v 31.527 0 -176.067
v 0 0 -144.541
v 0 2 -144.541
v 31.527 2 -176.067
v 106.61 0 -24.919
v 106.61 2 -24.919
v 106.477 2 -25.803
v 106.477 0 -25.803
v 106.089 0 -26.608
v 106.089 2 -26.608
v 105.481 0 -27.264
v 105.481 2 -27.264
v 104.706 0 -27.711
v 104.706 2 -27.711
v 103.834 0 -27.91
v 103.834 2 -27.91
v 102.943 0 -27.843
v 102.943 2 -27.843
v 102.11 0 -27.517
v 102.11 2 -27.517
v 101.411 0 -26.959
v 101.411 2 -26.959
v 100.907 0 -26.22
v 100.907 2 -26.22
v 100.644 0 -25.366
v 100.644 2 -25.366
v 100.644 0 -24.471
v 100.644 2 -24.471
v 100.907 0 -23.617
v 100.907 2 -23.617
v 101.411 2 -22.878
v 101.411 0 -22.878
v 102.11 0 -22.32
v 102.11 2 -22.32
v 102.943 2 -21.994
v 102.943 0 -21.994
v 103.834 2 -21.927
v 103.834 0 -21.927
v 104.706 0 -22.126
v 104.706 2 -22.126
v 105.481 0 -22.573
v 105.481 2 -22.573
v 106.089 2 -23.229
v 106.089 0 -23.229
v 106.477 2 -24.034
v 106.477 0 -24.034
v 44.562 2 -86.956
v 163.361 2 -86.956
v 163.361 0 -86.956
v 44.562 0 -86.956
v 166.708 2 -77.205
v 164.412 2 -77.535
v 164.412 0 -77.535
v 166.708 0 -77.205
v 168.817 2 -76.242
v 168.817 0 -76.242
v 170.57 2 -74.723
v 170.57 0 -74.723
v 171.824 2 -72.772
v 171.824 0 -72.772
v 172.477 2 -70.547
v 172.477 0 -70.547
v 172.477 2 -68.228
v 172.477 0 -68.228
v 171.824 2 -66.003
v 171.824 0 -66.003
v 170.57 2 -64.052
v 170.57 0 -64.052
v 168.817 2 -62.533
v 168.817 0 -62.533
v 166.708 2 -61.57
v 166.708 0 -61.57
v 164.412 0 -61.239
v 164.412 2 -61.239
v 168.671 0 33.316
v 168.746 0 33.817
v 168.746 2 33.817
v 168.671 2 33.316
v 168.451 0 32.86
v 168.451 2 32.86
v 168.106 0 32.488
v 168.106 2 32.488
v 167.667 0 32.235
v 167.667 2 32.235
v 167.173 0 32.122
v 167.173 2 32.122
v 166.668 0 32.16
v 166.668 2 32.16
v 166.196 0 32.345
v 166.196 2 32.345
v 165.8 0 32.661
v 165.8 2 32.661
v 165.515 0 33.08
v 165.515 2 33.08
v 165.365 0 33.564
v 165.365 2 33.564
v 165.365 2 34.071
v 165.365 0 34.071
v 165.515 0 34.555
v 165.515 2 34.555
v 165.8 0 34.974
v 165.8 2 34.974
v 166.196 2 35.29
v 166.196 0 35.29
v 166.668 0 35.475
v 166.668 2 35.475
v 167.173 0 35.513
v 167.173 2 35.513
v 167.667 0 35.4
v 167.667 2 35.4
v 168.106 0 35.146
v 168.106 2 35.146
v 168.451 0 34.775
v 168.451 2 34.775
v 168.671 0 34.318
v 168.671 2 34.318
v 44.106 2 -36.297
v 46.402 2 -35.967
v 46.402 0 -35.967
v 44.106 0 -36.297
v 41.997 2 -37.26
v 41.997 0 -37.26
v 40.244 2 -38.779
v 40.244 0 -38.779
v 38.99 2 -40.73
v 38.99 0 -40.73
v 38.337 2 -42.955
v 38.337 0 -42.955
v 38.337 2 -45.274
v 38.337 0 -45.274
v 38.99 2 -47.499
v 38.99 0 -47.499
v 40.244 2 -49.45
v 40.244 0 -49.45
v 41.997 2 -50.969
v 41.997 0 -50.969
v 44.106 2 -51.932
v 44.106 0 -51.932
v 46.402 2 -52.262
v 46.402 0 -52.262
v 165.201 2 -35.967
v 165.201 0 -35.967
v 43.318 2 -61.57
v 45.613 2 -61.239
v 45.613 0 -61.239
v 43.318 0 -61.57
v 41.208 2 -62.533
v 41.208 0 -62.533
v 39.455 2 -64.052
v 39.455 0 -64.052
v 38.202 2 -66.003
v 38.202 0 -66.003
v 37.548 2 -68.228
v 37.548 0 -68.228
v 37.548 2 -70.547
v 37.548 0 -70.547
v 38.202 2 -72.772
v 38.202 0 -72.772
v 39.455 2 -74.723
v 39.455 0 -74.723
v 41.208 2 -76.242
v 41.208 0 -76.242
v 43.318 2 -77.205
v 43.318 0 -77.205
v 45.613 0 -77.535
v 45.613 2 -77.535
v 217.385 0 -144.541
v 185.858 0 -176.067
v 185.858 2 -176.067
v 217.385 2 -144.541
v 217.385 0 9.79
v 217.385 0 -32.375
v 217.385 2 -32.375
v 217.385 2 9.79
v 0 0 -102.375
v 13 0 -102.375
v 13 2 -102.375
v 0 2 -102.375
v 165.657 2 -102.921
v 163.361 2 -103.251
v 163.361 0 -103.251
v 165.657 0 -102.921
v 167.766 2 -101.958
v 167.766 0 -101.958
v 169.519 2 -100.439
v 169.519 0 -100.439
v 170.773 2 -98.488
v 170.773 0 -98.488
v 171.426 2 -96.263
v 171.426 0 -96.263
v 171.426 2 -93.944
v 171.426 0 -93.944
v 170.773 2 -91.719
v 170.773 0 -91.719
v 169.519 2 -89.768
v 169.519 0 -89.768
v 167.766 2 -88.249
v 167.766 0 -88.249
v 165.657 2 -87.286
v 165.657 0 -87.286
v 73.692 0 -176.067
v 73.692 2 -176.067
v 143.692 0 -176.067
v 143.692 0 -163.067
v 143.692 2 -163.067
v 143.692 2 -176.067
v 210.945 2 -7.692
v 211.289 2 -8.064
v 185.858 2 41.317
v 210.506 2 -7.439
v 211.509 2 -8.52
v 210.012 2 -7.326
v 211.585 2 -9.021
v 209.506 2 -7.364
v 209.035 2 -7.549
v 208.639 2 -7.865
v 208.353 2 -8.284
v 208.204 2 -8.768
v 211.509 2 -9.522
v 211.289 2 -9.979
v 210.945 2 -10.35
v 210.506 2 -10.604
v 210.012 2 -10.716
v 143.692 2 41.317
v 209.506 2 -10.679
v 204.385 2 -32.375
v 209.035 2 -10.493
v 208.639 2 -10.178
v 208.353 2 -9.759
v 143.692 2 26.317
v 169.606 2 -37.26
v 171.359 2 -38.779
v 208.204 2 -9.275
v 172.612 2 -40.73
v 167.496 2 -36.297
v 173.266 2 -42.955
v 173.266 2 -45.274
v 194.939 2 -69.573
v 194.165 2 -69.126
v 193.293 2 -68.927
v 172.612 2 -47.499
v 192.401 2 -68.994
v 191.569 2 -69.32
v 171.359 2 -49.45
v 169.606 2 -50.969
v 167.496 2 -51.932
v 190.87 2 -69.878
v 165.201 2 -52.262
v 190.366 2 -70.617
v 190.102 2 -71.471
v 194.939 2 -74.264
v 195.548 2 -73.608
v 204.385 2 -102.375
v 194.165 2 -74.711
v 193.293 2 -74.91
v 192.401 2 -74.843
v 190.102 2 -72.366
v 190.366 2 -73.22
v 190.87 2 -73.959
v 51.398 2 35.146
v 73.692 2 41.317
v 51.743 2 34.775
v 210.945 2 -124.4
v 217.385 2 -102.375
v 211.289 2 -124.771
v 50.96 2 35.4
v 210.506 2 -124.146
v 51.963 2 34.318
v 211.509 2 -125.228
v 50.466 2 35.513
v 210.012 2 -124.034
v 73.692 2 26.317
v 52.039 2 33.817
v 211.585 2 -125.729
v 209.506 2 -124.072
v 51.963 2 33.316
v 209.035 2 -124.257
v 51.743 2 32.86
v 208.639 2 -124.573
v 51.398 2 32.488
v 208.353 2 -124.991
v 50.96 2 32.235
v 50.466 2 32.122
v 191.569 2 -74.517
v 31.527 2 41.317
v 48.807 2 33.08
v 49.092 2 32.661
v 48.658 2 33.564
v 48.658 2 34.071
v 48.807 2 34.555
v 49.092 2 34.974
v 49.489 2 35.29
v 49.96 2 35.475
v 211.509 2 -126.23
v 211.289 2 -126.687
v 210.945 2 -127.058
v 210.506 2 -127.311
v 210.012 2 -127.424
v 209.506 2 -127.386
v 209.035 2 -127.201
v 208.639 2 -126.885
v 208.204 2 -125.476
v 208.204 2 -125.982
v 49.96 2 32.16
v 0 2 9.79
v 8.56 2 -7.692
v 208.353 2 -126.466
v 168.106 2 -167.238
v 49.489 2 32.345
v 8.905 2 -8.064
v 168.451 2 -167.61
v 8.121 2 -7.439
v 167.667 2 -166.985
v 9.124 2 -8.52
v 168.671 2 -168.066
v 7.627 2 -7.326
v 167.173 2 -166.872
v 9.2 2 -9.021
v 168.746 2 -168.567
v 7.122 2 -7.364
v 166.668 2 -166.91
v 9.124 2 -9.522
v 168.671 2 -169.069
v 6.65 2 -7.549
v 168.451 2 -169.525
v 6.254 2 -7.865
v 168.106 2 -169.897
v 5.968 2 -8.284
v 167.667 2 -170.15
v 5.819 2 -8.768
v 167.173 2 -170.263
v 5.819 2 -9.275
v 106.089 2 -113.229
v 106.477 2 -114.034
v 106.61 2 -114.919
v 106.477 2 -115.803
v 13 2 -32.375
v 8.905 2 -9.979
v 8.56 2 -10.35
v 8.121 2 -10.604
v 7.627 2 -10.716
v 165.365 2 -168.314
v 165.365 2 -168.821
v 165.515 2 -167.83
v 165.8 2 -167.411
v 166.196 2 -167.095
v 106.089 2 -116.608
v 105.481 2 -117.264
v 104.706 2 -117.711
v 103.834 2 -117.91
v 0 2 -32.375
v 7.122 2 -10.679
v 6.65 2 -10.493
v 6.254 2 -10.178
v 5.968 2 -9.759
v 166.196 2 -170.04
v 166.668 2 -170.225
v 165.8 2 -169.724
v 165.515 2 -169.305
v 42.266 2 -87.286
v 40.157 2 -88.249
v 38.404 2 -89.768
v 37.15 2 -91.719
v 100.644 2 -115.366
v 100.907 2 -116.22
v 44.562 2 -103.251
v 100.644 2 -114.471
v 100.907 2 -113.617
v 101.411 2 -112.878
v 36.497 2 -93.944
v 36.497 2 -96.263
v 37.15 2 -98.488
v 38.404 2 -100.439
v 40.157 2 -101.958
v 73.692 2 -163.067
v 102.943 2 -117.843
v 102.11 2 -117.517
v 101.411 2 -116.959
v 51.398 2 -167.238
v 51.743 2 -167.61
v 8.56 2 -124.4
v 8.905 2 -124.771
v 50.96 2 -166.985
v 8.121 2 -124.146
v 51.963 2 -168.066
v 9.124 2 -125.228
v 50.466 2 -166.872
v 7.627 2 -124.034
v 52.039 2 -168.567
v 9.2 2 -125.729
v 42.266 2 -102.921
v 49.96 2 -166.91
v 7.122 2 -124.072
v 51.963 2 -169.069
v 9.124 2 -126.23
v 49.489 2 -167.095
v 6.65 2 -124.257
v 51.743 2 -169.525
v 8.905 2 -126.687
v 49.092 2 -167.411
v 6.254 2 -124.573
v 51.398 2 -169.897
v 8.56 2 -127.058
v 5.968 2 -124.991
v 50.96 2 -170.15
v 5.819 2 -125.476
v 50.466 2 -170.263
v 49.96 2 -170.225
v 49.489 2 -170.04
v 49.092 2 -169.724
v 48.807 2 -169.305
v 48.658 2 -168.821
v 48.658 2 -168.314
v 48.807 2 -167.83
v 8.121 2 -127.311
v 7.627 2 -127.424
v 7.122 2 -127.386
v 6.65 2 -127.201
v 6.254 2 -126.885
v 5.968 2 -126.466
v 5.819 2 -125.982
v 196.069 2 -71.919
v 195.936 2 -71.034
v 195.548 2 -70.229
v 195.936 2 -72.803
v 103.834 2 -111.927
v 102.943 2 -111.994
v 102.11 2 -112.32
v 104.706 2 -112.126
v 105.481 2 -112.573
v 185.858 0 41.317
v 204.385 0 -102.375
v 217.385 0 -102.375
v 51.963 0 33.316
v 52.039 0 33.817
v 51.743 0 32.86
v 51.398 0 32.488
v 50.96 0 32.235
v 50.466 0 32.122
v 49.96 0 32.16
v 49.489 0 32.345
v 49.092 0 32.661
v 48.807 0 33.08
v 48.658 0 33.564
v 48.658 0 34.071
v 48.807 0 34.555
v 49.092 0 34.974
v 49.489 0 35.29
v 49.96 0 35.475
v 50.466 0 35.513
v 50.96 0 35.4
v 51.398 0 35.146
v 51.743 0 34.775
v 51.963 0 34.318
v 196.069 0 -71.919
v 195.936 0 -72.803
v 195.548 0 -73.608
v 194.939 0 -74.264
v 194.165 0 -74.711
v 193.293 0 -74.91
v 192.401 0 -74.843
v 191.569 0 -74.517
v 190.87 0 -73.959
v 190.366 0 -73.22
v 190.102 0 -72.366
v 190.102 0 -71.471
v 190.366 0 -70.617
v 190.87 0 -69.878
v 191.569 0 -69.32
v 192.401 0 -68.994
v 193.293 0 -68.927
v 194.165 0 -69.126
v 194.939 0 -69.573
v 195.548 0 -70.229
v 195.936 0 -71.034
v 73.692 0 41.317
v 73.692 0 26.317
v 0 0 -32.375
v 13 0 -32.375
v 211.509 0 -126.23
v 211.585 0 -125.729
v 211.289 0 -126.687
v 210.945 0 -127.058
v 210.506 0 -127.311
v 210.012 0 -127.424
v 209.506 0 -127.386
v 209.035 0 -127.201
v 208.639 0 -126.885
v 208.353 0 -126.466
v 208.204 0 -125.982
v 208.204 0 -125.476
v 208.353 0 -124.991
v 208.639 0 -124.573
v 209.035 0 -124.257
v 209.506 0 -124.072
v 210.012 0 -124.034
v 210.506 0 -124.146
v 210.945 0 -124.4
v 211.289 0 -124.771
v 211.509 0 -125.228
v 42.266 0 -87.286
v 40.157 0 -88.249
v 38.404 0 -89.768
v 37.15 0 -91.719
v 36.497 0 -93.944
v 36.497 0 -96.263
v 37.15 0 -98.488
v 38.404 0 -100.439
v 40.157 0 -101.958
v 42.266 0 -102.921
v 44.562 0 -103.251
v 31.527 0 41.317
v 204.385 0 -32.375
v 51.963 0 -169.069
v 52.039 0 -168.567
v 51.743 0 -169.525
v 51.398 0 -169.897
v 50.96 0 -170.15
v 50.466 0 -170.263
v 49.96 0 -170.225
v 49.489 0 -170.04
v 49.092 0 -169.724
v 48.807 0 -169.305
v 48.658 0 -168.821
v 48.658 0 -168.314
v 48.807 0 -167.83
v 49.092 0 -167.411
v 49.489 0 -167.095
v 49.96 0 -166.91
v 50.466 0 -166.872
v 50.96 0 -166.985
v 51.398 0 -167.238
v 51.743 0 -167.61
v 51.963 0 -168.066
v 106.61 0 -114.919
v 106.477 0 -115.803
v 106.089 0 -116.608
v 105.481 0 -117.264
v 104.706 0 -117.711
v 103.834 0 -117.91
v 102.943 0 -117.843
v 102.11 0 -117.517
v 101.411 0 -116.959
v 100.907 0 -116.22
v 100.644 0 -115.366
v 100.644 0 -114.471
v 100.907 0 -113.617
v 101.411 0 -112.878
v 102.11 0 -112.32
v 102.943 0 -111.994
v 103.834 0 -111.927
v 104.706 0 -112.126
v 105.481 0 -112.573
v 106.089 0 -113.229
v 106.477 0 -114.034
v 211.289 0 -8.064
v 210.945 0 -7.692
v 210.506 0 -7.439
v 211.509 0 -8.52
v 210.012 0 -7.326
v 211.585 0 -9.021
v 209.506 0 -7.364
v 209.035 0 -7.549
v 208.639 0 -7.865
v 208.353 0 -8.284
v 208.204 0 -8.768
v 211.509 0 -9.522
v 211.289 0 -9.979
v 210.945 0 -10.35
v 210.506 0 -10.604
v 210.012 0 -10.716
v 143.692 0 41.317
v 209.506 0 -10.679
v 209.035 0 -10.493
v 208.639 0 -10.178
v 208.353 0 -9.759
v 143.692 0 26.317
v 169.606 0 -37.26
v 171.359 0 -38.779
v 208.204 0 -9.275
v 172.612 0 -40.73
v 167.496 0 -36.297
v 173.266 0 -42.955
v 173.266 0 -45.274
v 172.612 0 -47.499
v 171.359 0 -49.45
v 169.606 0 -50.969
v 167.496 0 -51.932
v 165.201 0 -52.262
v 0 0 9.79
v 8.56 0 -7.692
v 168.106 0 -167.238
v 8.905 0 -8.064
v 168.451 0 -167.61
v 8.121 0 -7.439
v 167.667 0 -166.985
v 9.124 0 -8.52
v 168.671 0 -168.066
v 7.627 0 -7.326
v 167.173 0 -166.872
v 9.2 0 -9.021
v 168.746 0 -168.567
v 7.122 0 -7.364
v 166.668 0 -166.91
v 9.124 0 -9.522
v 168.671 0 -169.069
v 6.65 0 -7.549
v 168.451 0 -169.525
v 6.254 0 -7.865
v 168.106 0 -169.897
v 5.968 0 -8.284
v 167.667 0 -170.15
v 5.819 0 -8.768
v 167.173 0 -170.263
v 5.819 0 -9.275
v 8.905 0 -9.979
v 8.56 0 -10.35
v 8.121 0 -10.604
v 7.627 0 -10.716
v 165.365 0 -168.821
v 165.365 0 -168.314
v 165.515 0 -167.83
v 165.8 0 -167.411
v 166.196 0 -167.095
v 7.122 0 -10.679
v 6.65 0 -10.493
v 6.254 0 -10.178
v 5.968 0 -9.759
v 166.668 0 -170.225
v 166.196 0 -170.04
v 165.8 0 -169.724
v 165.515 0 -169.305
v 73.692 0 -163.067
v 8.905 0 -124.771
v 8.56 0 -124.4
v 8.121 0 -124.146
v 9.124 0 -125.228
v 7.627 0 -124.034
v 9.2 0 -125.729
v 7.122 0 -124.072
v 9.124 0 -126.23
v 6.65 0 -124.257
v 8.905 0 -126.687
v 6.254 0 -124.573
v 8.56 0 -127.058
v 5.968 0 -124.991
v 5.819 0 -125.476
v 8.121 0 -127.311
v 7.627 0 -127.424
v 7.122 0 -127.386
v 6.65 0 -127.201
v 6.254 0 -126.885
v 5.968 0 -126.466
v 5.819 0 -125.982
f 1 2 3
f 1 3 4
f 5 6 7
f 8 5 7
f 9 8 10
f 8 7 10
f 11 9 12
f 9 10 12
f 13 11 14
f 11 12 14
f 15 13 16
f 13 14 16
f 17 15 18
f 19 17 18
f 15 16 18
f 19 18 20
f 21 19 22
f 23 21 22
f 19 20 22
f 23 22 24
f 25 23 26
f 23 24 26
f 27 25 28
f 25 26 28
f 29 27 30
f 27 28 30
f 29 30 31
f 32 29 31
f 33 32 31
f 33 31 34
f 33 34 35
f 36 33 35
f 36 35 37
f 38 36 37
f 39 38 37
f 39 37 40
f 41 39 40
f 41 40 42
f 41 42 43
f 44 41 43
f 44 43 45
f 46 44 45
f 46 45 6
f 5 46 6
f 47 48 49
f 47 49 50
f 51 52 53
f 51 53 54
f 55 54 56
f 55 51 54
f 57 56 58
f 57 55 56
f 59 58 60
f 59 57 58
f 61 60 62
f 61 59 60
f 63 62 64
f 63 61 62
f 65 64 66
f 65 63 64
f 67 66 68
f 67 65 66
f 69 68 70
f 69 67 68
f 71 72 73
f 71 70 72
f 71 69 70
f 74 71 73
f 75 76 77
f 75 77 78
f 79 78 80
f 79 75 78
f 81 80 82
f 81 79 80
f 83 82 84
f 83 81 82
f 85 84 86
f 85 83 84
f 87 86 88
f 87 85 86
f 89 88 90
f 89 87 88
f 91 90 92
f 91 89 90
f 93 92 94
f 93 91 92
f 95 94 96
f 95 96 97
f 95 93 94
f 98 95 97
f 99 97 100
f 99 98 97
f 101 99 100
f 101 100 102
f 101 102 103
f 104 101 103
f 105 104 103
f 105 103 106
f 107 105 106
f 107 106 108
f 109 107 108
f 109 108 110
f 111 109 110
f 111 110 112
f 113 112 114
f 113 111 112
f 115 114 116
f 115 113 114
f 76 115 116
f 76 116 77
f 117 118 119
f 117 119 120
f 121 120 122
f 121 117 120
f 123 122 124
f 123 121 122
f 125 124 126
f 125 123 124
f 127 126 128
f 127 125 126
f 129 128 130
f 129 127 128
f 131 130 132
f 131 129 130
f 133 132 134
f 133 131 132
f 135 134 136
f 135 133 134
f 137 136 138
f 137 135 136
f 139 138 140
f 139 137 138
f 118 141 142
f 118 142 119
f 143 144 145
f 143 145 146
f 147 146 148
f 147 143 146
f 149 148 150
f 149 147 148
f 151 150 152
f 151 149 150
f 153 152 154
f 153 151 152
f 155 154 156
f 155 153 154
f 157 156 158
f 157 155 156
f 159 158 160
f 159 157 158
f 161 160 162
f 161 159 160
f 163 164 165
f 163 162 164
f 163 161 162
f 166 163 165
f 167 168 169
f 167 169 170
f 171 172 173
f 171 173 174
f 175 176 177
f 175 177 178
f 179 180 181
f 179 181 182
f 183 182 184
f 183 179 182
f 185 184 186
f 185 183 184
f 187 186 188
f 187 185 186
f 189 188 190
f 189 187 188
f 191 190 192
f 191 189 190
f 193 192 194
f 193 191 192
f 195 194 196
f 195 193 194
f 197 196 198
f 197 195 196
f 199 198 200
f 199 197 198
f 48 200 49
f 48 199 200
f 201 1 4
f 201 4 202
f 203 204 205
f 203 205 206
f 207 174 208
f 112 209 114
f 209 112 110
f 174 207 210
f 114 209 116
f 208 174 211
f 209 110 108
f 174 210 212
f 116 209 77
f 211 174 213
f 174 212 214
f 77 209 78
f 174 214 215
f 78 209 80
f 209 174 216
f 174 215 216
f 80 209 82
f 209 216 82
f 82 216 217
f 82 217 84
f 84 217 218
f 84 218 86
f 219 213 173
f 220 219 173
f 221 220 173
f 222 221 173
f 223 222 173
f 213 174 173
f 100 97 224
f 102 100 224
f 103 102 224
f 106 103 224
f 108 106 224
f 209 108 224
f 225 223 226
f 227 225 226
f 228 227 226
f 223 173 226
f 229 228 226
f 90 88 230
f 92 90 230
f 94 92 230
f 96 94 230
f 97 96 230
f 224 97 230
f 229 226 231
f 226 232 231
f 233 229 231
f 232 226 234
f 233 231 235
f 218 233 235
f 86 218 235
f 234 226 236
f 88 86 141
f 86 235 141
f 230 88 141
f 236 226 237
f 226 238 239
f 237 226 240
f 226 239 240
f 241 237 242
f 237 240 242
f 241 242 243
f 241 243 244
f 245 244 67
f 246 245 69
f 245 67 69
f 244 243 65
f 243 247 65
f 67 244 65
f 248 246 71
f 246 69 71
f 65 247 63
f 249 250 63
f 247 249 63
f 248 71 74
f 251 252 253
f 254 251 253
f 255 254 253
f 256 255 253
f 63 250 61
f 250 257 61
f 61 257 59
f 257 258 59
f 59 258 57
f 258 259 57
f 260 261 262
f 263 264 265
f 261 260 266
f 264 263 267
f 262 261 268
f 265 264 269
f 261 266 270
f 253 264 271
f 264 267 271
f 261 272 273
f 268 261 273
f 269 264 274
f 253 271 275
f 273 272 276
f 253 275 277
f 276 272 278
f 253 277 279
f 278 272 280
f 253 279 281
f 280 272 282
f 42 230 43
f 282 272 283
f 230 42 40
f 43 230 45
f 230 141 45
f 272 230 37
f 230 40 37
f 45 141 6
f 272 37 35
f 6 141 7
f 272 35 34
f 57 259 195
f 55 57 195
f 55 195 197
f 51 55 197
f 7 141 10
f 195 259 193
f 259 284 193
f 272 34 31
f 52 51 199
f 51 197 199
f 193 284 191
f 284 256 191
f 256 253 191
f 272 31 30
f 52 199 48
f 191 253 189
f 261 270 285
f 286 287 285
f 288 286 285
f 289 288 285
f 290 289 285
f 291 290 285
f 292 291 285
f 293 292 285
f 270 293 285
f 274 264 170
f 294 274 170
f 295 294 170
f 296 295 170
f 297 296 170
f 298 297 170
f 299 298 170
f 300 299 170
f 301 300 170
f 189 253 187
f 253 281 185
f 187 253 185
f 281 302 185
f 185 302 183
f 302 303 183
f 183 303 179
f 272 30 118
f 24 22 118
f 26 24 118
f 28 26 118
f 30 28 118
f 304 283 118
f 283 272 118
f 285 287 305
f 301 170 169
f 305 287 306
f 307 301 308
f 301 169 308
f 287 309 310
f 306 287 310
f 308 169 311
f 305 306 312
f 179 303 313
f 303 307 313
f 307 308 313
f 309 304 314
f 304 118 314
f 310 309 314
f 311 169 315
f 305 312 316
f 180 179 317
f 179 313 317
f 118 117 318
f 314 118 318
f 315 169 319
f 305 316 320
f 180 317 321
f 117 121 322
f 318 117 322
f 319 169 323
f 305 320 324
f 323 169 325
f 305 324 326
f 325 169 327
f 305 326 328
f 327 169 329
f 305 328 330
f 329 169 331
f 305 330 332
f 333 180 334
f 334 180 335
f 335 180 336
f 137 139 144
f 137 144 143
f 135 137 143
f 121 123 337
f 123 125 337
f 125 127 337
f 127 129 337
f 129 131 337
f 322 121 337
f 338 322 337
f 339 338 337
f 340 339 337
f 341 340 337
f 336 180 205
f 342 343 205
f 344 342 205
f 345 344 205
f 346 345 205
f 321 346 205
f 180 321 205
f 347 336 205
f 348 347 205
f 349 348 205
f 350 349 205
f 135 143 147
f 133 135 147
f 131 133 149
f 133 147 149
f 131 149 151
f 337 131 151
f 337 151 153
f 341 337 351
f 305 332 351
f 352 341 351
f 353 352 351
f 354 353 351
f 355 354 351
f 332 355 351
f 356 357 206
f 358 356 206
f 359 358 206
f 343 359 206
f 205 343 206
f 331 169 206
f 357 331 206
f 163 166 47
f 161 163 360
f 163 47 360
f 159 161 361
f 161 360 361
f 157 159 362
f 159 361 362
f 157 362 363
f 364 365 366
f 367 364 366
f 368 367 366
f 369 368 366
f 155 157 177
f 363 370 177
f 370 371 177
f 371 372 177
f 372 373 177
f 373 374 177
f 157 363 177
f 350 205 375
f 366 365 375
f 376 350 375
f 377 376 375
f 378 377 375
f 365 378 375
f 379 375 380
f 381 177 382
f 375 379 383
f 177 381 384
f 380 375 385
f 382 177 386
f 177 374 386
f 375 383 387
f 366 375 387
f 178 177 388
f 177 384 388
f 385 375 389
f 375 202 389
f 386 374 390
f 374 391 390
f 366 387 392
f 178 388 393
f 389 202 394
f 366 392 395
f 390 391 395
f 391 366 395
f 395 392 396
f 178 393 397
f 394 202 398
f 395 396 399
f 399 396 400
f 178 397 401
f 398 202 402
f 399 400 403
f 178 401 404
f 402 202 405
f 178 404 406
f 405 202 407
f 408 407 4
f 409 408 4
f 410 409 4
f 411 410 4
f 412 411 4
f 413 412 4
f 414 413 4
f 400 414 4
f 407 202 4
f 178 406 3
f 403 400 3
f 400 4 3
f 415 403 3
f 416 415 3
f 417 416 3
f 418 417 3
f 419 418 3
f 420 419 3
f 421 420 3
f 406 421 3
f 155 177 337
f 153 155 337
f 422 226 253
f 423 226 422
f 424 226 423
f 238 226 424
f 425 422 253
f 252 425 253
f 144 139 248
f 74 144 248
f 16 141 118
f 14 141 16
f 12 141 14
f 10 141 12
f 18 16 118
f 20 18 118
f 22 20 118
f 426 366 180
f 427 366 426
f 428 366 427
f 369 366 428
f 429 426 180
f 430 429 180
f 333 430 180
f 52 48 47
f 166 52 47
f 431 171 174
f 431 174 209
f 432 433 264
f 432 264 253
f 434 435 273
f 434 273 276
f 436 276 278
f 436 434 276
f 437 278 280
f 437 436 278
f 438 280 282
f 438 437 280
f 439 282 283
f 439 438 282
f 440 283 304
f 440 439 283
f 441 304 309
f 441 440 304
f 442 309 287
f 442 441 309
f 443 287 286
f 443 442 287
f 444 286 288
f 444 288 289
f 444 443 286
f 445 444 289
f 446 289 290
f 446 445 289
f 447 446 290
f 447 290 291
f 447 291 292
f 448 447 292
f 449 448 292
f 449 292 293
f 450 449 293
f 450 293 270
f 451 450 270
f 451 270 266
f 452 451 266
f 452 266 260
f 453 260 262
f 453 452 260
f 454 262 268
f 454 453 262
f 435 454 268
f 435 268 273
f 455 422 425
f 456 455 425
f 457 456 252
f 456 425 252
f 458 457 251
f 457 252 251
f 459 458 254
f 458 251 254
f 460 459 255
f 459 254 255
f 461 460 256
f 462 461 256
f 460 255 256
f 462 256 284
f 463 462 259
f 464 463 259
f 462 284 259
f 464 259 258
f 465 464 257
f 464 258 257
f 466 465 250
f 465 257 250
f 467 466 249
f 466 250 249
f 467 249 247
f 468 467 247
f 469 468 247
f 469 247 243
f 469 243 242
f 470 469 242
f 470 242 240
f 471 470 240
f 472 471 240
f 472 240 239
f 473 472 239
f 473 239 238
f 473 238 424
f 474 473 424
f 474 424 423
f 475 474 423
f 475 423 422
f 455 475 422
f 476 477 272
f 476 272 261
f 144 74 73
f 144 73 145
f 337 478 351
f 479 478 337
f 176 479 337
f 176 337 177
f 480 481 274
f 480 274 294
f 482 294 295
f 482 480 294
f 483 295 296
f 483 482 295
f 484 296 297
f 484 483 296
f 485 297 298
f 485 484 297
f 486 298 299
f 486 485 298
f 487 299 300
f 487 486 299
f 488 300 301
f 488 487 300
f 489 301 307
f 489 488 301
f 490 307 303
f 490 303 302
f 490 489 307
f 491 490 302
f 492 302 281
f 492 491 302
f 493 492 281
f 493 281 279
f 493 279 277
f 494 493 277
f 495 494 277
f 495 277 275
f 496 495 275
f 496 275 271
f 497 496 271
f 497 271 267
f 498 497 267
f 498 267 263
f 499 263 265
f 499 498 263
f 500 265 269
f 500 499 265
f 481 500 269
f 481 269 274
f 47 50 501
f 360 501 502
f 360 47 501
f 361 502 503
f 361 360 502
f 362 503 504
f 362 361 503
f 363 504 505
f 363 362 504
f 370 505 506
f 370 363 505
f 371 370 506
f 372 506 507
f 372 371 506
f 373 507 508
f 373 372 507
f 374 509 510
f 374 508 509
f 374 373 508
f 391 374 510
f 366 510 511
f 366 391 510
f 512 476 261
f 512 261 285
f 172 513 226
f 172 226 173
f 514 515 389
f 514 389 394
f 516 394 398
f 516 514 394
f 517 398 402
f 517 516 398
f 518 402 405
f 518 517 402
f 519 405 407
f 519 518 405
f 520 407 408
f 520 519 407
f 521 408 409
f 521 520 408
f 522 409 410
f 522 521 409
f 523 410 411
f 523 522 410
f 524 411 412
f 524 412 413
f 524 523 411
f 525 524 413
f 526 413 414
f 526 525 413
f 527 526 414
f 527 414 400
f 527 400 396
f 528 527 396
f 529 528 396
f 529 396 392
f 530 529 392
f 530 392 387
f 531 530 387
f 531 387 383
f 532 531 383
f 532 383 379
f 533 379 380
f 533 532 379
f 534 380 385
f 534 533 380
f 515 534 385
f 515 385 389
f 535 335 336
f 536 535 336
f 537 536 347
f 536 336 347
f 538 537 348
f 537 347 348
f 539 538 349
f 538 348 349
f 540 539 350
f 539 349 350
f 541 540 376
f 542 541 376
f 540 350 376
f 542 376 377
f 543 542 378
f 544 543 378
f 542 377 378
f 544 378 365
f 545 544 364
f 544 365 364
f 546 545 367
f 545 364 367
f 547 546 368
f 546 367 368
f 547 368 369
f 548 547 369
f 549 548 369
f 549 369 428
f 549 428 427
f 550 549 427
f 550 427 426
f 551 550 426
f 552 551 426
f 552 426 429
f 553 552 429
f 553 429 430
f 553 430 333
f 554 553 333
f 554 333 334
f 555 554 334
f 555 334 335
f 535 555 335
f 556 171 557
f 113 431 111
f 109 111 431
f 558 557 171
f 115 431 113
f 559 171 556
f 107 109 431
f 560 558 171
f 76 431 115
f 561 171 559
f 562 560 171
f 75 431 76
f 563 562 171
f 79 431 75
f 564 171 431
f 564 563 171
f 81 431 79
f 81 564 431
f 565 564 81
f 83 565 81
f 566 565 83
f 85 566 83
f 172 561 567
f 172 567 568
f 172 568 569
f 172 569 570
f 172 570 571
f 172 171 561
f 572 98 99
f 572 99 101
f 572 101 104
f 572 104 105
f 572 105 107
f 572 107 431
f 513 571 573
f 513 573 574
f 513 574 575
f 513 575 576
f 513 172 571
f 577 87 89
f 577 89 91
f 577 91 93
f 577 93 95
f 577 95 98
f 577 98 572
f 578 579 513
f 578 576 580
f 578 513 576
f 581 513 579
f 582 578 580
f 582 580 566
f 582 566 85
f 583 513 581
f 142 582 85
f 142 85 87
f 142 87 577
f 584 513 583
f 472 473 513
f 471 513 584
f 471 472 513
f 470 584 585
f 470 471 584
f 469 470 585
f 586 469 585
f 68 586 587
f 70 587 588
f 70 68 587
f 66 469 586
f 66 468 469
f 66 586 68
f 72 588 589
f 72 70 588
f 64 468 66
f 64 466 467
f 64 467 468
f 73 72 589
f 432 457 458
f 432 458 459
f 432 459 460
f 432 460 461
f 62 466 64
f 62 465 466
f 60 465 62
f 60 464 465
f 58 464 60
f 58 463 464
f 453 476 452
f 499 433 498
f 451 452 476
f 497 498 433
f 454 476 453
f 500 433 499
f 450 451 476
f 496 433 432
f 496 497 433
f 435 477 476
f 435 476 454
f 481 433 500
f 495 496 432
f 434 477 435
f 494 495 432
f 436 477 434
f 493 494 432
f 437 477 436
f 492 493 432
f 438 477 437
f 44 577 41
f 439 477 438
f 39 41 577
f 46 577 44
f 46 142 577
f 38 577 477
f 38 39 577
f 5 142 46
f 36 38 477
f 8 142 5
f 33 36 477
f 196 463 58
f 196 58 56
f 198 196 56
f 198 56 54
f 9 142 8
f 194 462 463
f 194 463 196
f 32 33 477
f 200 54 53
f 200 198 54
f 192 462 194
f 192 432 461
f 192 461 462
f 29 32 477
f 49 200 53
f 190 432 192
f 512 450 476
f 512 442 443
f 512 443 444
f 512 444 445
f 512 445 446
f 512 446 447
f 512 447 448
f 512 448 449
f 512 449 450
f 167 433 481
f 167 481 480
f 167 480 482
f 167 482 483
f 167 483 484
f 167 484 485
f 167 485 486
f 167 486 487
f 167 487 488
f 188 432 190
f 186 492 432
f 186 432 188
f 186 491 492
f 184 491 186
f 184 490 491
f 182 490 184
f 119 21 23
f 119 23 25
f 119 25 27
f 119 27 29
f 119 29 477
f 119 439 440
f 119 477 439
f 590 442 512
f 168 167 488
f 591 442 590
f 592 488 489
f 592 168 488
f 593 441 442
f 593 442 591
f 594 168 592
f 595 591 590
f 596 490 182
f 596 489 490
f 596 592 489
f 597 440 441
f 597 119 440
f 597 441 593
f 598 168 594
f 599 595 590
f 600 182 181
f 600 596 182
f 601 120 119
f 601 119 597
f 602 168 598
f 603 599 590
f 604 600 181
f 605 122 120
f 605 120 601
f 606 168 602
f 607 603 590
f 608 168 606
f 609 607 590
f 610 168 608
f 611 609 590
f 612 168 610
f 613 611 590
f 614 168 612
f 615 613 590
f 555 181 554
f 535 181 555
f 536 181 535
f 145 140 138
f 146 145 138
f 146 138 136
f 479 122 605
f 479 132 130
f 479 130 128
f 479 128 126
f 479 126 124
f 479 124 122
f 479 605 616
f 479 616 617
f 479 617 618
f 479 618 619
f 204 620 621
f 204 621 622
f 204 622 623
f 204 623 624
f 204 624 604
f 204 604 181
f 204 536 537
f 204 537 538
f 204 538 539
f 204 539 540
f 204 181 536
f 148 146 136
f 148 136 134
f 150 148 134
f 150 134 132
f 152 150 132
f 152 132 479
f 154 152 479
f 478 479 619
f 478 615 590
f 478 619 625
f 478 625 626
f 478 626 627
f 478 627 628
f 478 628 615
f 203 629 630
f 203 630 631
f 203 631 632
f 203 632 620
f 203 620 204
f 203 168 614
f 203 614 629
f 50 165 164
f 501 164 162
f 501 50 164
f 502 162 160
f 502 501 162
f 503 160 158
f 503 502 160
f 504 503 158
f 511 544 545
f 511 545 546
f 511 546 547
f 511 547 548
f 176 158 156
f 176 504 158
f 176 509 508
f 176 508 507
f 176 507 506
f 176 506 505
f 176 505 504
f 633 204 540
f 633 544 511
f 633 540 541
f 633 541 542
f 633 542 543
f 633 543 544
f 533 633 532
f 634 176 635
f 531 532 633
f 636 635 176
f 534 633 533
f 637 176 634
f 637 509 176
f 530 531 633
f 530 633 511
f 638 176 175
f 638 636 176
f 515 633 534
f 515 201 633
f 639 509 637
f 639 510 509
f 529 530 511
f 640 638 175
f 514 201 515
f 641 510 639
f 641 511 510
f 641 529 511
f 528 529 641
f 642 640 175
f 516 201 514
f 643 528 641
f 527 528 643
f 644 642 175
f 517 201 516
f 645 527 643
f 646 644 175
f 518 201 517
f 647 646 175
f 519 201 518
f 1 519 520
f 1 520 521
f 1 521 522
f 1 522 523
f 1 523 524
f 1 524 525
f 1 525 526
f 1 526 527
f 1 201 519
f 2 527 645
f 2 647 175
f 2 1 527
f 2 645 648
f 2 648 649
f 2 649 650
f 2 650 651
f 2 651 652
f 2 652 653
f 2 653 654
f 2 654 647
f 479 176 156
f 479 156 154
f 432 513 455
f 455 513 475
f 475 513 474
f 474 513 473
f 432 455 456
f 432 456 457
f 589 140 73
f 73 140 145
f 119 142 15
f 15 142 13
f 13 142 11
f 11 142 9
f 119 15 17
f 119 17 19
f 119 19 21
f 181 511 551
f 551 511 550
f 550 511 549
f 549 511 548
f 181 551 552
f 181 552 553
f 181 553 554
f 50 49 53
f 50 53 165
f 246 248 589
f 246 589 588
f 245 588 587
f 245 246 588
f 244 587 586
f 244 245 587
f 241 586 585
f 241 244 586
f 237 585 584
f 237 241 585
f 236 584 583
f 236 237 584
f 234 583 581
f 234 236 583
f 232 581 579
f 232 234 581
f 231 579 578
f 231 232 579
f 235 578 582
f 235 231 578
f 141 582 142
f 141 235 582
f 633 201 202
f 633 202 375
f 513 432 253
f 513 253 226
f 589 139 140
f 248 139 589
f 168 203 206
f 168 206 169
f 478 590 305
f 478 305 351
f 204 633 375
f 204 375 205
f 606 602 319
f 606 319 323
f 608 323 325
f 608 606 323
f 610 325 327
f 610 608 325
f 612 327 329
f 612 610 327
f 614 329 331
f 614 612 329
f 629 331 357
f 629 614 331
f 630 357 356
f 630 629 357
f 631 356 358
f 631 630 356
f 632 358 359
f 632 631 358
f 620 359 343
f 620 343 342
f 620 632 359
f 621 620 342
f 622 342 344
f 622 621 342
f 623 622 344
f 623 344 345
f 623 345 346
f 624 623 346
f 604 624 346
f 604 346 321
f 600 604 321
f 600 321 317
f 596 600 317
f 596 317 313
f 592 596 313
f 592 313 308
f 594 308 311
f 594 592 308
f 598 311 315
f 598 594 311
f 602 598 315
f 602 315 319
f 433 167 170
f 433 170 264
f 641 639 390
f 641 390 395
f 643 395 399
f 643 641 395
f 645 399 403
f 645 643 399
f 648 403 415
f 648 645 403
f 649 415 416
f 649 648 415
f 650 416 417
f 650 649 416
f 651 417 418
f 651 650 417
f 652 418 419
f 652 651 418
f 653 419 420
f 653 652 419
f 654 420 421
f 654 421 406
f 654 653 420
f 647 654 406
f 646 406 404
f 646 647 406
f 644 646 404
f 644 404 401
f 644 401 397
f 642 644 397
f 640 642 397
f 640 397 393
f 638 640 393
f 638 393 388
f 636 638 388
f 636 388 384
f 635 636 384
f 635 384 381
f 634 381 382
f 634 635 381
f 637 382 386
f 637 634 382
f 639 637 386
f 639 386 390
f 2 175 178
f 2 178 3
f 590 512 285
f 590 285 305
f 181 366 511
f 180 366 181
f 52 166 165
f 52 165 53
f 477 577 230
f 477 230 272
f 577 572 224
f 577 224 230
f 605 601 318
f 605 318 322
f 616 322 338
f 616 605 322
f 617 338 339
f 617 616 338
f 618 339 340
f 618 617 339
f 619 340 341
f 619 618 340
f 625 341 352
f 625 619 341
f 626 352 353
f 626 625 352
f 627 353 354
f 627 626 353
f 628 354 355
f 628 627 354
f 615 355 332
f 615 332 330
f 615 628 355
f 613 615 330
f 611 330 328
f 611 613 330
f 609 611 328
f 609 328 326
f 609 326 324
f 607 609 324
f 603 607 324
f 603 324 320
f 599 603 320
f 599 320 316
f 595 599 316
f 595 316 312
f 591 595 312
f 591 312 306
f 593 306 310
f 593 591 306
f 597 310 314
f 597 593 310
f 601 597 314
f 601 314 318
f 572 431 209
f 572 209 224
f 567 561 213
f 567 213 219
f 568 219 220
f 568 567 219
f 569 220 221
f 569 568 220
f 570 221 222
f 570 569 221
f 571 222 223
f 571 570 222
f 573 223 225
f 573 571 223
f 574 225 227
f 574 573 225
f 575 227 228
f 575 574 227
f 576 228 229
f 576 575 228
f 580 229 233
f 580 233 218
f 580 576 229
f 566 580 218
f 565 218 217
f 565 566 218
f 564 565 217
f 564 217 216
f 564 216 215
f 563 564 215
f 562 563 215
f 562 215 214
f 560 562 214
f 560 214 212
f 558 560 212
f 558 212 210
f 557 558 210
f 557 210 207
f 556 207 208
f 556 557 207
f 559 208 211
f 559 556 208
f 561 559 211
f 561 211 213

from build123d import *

# Parameters (mm, degrees)
SKETCH_1_R          = 1.7
EXTRUDE_1_DEPTH     = 2
SKETCH_3_R          = 3
CUT_EXTRUDE_1_DEPTH = 10
CUT_EXTRUDE_2_DEPTH = 10


with BuildPart() as part:
    # 草图1 → 凸台-拉伸1 (new body)
    with BuildSketch(Plane(origin=(0, 0, 0), x_dir=(1, 0, 0), z_dir=(0, 1, 0))):
        Polygon((0, -9.790421162), (0, 32.375054838), (13, 32.375054838), (13, 102.375054838), (0, 102.375054838), (0, 144.54053128), (31.526911935, 176.067443214), (73.692388376, 176.067443215), (73.692388376, 163.067443215), (143.692388376, 163.067443215), (143.692388376, 176.067443215), (185.857864376, 176.067443214), (217.384776311, 144.54053128), (217.384776311, 102.375054838), (204.384776311, 102.375054838), (204.384776311, 32.375054838), (217.384776311, 32.375054838), (217.384776311, -9.790421162), (185.857864376, -41.317333096), (143.692388376, -41.317333096), (143.692388376, -26.317333096), (73.692388376, -26.317333096), (73.692388376, -41.317333096), (31.526911935, -41.317333096), align=None)
        with Locations((209.884776311, 9.021225987)):
            Circle(SKETCH_1_R, mode=Mode.SUBTRACT)
        with Locations((209.884776311, 125.728884132)):
            Circle(SKETCH_1_R, mode=Mode.SUBTRACT)
        with Locations((167.046217228, 168.567443215)):
            Circle(SKETCH_1_R, mode=Mode.SUBTRACT)
        with Locations((50.338559083, 168.567443214)):
            Circle(SKETCH_1_R, mode=Mode.SUBTRACT)
        with Locations((7.5, 125.728884132)):
            Circle(SKETCH_1_R, mode=Mode.SUBTRACT)
        with Locations((7.5, 9.021225987)):
            Circle(SKETCH_1_R, mode=Mode.SUBTRACT)
        with Locations((50.338559083, -33.817333096)):
            Circle(SKETCH_1_R, mode=Mode.SUBTRACT)
        with Locations((167.046217228, -33.817333096)):
            Circle(SKETCH_1_R, mode=Mode.SUBTRACT)
    extrude(amount=EXTRUDE_1_DEPTH)

    # 草图3 → 切除-拉伸1 (cut)
    with BuildSketch(Plane(origin=(0, 2, 0), x_dir=(1, 0, 0), z_dir=(0, 1, 0))):
        with Locations((103.610094152, 114.918520178)):
            Circle(SKETCH_3_R)
        with Locations((103.610094152, 24.918520178)):
            Circle(SKETCH_3_R)
        with Locations((193.068894152, 71.918520178)):
            Circle(SKETCH_3_R)
    extrude(amount=-CUT_EXTRUDE_1_DEPTH, mode=Mode.SUBTRACT)

    # 草图4 → 切除-拉伸2 (cut)
    with BuildSketch(Plane(origin=(0, 2, 0), x_dir=(1, 0, 0), z_dir=(0, 1, 0))):
        with BuildLine():
            Line((44.561779376, 103.251399725), (163.361103837, 103.251399725))
            ThreePointArc((163.361103837, 103.251399725), (171.508845116, 95.103658445), (163.361103837, 86.955917166))
            Line((163.361103837, 86.955917166), (44.561779376, 86.955917166))
            ThreePointArc((44.561779376, 86.955917166), (36.414038096, 95.103658445), (44.561779376, 103.251399725))
        make_face()
        with BuildLine():
            Line((45.613100831, 77.534957336), (164.412425292, 77.534957336))
            ThreePointArc((164.412425292, 77.534957336), (172.560166571, 69.387216057), (164.412425292, 61.239474778))
            Line((164.412425292, 61.239474778), (45.613100831, 61.239474778))
            ThreePointArc((45.613100831, 61.239474778), (37.465359552, 69.387216057), (45.613100831, 77.534957336))
        make_face()
        with BuildLine():
            Line((46.401591922, 52.262309138), (165.200916384, 52.262309138))
            ThreePointArc((165.200916384, 52.262309138), (173.348657663, 44.114567858), (165.200916384, 35.966826579))
            Line((165.200916384, 35.966826579), (46.401591922, 35.966826579))
            ThreePointArc((46.401591922, 35.966826579), (38.253850643, 44.114567858), (46.401591922, 52.262309138))
        make_face()
    extrude(amount=-CUT_EXTRUDE_2_DEPTH, mode=Mode.SUBTRACT)


solid = part.part
